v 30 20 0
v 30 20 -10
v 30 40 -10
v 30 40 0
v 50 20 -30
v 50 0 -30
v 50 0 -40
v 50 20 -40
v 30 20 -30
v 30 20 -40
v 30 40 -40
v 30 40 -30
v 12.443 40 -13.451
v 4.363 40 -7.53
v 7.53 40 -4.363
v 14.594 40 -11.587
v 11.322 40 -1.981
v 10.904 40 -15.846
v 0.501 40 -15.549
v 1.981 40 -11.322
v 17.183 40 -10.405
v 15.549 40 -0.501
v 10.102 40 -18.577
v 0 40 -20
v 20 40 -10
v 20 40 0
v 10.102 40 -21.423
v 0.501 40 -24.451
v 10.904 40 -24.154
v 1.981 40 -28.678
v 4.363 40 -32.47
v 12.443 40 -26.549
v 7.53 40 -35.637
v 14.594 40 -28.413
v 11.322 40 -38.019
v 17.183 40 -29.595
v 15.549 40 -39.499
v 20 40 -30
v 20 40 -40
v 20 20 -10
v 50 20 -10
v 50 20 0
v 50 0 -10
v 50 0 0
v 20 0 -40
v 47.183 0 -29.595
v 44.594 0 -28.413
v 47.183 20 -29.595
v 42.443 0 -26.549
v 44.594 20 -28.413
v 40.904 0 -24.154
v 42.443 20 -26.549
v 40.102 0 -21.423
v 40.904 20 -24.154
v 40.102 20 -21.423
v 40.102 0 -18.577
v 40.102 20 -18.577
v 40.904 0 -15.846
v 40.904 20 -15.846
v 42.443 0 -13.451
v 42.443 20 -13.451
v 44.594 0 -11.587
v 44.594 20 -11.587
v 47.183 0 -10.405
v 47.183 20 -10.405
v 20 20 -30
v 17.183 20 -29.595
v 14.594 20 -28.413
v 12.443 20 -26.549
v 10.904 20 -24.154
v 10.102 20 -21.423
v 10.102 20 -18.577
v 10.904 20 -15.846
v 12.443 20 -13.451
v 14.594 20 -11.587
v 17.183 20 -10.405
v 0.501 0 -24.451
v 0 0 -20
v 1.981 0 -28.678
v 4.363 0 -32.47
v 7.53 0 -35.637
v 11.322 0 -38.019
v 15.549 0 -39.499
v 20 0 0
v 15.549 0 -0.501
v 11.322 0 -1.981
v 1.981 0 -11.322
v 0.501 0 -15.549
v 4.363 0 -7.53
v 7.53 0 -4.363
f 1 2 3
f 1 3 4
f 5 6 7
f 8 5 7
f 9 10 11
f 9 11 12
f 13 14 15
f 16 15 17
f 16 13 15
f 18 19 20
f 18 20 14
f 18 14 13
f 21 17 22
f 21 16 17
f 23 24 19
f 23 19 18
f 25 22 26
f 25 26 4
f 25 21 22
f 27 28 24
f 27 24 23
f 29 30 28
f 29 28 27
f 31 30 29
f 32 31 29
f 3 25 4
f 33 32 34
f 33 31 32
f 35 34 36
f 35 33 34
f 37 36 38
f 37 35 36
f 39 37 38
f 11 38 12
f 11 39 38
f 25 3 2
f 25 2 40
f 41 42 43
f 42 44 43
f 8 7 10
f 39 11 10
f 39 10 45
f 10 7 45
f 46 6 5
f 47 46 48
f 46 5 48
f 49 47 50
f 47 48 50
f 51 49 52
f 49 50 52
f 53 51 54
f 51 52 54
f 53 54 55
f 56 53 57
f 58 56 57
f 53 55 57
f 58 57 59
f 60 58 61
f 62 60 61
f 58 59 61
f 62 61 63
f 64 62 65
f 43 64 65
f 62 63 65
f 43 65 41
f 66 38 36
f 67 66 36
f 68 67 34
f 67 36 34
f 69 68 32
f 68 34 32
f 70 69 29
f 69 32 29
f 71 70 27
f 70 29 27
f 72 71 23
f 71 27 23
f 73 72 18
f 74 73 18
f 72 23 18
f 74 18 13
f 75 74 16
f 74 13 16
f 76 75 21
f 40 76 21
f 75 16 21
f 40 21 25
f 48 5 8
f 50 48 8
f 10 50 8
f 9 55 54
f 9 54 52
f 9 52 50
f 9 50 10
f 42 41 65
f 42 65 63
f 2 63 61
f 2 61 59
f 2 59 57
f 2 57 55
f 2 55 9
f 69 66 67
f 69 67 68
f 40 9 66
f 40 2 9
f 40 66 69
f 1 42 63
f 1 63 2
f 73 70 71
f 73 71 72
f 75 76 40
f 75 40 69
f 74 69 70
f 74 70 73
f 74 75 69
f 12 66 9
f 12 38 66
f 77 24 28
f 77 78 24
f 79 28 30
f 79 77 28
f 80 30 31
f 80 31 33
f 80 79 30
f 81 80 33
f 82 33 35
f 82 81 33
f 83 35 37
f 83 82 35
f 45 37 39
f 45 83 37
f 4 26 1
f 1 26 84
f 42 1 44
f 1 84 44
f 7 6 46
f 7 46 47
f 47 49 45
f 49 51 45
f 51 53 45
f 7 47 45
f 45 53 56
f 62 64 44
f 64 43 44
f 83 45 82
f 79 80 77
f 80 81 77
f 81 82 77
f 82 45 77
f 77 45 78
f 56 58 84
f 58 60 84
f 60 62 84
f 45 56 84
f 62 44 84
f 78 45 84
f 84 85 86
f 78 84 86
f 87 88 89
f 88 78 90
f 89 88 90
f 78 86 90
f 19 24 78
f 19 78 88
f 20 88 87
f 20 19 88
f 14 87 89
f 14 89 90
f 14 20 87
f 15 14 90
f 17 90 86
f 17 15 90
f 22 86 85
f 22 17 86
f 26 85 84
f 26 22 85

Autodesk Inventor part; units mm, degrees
ref_plane "YZ Plane" through (0, 0, 0) normal (1, 0, 0) x (0, 1, 0)
ref_plane "XZ Plane" through (0, 0, 0) normal (0, 1, 0) x (-1, 0, 0)
ref_plane "XY Plane" through (0, 0, 0) normal (0, 0, 1) x (1, 0, 0)
sketch "草圖1" plane through (0, 0, 0) normal (0, 1, 0) x (-1, 0, 0)
  line L0 (0, 0) -> (-50, 0)
  line L1 (-50, 0) -> (-50, -40)
  line L2 (-50, -40) -> (0, -40)
  line L3 (0, -40) -> (0, 0)
  dimension "d0" = 50
  dimension "d1" = 40
extrude "擠出1" add sketch "草圖1" along normal blind 20
sketch "草圖2" plane through (0, 20, 0) normal (0, 1, 0) x (1, 0, 0)
  line L0 (50, 40) -> (0, 40) projected
  line L1 (0, 0) -> (50, 0) projected
  line L2 (0, 40) -> (30, 40)
  line L3 (30, 40) -> (30, 0)
  line L4 (30, 0) -> (0, 0)
  line L5 (0, 0) -> (0, 40)
  dimension "d4" = 30
extrude "擠出2" add sketch "草圖2" along normal blind 20
fillet "圓角1" radius 20 2 edges at (0, 20, 0) (0, 20, -40)
sketch "草圖3" plane through (0, 40, 0) normal (0, 1, 0) x (1, 0, 0)
  arc A0 (20, 40) -> (20, 0) centre (20, 20) ccw projected
  line L0 (20, 0) -> (30, 0) projected
  line L1 (30, 0) -> (30, 40) projected
  line L2 (30, 40) -> (20, 40) projected
  arc A1 (20, 30) -> (20, 10) centre (20, 20) ccw
  line L3 (20, 30) -> (20, 30)
  line L4 (20, 30) -> (20, 10)
  line L5 (20, 10) -> (20, 10)
  line L6 (20, 30) -> (39.9509, 30)
  line L7 (39.9509, 30) -> (39.9509, 10)
  line L8 (39.9509, 10) -> (20, 10)
  line L9 (20, 10) -> (20, 30)
  point P0 (0, 0)
  dimension "d8" = 20
extrude "擠出3" cut sketch "草圖3" against normal blind 20 contours L6 L7 L8 L1 | L1 L8 L4 L6 | L4 A1
sketch "草圖4" plane through (0, 20, 0) normal (0, 1, 0) x (1, 0, 0)
  line L0 (50, 0) -> (50, 40) projected
  circle A0 centre (50, 20) radius 10
  point P0 (0, 0)
  dimension "d11" = 20
extrude "擠出4" cut sketch "草圖4" against normal blind 20
properties part number "29"
